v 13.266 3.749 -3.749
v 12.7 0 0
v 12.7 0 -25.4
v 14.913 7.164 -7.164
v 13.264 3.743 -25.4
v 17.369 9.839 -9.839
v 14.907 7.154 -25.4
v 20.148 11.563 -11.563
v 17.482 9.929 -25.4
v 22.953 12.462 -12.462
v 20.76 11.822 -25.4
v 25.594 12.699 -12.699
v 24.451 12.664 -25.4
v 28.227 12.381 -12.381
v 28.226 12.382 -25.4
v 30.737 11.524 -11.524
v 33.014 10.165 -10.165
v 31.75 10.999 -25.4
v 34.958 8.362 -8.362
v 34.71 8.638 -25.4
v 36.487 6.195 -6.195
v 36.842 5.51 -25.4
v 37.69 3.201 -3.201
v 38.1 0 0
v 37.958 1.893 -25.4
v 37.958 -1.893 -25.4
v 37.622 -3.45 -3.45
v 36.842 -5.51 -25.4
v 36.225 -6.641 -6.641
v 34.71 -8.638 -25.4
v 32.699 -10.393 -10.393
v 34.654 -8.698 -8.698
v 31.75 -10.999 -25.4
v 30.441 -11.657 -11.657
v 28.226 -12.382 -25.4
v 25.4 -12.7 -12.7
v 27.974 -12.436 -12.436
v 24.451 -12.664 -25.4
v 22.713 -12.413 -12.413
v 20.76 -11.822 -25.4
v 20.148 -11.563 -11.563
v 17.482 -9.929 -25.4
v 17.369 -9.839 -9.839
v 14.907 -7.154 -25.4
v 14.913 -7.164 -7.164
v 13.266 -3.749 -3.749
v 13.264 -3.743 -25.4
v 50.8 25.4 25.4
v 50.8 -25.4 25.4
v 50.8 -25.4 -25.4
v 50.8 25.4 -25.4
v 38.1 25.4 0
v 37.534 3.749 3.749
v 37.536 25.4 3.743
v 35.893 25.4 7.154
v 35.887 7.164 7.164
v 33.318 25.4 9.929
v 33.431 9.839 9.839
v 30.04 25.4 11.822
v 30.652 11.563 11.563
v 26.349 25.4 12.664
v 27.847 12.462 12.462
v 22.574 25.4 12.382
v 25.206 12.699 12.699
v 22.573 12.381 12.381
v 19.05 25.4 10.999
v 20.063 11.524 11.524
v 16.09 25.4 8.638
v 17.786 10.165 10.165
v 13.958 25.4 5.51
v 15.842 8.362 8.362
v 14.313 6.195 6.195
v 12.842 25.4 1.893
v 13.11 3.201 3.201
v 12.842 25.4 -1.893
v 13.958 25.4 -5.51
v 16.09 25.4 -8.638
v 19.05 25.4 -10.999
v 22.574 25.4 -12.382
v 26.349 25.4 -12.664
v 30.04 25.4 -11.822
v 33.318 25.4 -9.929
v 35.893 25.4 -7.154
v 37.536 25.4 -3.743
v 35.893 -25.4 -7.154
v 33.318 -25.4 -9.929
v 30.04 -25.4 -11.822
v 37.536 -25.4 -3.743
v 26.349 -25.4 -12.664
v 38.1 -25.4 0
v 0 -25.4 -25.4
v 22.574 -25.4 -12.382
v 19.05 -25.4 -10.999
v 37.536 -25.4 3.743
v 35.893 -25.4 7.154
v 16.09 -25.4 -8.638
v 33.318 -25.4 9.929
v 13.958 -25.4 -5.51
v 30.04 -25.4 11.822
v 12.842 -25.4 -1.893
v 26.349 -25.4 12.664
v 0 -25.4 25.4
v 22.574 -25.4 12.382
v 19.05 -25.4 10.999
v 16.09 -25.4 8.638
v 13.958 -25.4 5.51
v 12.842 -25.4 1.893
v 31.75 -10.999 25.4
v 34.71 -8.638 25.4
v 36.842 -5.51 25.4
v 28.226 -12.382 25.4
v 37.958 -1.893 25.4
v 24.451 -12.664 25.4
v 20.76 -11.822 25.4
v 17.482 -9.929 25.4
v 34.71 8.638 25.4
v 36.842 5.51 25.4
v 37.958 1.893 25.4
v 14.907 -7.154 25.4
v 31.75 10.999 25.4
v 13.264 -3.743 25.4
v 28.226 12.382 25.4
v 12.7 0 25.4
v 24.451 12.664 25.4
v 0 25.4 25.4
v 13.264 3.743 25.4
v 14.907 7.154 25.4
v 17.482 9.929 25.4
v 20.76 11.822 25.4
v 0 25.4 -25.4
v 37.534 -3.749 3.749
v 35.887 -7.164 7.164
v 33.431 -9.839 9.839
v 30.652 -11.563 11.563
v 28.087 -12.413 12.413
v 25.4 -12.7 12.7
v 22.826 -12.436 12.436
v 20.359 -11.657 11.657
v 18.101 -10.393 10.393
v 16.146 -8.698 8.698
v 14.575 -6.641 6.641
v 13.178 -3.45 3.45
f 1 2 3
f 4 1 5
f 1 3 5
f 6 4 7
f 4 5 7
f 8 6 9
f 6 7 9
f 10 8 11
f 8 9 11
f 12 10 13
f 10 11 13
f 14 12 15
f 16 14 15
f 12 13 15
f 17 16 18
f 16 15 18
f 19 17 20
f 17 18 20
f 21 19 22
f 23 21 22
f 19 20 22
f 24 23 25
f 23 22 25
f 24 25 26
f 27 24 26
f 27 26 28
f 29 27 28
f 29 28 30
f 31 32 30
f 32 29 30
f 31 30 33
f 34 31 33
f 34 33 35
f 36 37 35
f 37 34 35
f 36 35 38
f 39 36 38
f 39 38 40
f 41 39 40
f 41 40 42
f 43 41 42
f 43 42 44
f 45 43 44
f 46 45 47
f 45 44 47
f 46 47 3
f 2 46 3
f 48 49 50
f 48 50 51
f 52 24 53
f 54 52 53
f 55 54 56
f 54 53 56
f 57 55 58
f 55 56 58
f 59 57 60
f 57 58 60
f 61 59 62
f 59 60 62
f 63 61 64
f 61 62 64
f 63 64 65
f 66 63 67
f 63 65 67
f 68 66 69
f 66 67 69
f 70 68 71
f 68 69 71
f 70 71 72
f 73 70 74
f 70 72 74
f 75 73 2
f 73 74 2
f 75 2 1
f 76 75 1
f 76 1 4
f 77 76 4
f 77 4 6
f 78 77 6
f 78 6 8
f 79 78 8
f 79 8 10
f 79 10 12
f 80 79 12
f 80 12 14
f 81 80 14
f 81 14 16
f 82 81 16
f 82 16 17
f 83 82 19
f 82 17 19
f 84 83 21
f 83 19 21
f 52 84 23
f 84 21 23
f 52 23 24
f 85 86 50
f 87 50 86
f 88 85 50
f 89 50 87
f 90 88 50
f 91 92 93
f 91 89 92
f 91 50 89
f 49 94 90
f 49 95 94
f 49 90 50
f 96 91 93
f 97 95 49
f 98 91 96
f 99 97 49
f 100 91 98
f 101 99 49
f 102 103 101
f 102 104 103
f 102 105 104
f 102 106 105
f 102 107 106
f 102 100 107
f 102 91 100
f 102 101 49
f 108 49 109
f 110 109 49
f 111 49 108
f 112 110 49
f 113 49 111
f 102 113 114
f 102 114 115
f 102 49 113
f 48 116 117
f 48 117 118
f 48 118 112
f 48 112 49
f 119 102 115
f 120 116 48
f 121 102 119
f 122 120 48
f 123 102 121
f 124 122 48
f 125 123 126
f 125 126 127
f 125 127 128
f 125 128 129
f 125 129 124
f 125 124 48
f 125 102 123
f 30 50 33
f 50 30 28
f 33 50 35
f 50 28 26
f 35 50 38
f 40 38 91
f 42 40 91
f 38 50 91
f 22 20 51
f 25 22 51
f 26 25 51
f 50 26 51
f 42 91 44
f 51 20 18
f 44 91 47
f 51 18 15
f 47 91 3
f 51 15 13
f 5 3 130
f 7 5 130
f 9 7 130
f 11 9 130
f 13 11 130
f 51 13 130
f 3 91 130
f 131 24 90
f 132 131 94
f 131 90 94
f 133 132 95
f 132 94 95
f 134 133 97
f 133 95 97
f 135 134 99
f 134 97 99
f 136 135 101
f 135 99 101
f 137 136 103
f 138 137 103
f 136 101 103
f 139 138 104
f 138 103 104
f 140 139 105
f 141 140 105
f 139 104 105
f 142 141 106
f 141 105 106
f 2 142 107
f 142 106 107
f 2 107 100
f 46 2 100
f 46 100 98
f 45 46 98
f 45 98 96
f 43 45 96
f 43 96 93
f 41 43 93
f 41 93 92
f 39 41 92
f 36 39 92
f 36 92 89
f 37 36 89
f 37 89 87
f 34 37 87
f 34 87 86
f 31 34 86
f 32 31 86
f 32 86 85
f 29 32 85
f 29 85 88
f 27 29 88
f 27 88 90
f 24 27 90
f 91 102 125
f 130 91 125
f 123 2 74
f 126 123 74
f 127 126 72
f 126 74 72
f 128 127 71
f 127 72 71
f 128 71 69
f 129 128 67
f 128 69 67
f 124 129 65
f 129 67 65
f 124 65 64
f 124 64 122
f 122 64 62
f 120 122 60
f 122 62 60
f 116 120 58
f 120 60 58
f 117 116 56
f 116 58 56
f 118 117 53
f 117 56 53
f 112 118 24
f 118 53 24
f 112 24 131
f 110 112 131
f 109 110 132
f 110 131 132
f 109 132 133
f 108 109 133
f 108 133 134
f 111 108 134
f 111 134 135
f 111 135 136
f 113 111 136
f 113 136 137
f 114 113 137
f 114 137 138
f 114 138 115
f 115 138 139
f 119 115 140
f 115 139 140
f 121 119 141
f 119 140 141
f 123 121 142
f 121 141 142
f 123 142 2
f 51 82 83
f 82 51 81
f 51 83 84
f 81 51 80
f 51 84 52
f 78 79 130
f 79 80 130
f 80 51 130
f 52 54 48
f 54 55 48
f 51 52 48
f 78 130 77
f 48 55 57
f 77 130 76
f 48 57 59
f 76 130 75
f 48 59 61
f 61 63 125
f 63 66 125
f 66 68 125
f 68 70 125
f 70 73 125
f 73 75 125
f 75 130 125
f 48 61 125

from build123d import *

# Parameters (mm, degrees)
F0_W     = 50.8
F0_H     = 50.8
F0_R     = 12.7
F1_DEPTH = 50.8
F3_D     = 25.4
F5_D     = 25.4


# Not quite as in the source:
# - the program builds the solid bodies; features that only make, move or delete a surface that nothing else refers to are left out


with BuildPart() as f1:
    # F0 (on Right) → F1 (new body)
    with BuildSketch(Plane.YZ):
        Rectangle(F0_W, F0_H)
        Circle(F0_R, mode=Mode.SUBTRACT)
        Circle(F0_R)
    extrude(amount=F1_DEPTH)

    # F3 (through all)
    with Locations(Plane(origin=(0, 25.4, 0), x_dir=(-1, 0, 0), z_dir=(0, 1, 0))):
        with Locations((-25.4, 0)):
            Hole(F3_D / 2)

    # F5 (through all)
    with Locations(Plane.XY.offset(25.4)):
        with Locations((25.4, 0)):
            Hole(F5_D / 2)


solid = f1.part
